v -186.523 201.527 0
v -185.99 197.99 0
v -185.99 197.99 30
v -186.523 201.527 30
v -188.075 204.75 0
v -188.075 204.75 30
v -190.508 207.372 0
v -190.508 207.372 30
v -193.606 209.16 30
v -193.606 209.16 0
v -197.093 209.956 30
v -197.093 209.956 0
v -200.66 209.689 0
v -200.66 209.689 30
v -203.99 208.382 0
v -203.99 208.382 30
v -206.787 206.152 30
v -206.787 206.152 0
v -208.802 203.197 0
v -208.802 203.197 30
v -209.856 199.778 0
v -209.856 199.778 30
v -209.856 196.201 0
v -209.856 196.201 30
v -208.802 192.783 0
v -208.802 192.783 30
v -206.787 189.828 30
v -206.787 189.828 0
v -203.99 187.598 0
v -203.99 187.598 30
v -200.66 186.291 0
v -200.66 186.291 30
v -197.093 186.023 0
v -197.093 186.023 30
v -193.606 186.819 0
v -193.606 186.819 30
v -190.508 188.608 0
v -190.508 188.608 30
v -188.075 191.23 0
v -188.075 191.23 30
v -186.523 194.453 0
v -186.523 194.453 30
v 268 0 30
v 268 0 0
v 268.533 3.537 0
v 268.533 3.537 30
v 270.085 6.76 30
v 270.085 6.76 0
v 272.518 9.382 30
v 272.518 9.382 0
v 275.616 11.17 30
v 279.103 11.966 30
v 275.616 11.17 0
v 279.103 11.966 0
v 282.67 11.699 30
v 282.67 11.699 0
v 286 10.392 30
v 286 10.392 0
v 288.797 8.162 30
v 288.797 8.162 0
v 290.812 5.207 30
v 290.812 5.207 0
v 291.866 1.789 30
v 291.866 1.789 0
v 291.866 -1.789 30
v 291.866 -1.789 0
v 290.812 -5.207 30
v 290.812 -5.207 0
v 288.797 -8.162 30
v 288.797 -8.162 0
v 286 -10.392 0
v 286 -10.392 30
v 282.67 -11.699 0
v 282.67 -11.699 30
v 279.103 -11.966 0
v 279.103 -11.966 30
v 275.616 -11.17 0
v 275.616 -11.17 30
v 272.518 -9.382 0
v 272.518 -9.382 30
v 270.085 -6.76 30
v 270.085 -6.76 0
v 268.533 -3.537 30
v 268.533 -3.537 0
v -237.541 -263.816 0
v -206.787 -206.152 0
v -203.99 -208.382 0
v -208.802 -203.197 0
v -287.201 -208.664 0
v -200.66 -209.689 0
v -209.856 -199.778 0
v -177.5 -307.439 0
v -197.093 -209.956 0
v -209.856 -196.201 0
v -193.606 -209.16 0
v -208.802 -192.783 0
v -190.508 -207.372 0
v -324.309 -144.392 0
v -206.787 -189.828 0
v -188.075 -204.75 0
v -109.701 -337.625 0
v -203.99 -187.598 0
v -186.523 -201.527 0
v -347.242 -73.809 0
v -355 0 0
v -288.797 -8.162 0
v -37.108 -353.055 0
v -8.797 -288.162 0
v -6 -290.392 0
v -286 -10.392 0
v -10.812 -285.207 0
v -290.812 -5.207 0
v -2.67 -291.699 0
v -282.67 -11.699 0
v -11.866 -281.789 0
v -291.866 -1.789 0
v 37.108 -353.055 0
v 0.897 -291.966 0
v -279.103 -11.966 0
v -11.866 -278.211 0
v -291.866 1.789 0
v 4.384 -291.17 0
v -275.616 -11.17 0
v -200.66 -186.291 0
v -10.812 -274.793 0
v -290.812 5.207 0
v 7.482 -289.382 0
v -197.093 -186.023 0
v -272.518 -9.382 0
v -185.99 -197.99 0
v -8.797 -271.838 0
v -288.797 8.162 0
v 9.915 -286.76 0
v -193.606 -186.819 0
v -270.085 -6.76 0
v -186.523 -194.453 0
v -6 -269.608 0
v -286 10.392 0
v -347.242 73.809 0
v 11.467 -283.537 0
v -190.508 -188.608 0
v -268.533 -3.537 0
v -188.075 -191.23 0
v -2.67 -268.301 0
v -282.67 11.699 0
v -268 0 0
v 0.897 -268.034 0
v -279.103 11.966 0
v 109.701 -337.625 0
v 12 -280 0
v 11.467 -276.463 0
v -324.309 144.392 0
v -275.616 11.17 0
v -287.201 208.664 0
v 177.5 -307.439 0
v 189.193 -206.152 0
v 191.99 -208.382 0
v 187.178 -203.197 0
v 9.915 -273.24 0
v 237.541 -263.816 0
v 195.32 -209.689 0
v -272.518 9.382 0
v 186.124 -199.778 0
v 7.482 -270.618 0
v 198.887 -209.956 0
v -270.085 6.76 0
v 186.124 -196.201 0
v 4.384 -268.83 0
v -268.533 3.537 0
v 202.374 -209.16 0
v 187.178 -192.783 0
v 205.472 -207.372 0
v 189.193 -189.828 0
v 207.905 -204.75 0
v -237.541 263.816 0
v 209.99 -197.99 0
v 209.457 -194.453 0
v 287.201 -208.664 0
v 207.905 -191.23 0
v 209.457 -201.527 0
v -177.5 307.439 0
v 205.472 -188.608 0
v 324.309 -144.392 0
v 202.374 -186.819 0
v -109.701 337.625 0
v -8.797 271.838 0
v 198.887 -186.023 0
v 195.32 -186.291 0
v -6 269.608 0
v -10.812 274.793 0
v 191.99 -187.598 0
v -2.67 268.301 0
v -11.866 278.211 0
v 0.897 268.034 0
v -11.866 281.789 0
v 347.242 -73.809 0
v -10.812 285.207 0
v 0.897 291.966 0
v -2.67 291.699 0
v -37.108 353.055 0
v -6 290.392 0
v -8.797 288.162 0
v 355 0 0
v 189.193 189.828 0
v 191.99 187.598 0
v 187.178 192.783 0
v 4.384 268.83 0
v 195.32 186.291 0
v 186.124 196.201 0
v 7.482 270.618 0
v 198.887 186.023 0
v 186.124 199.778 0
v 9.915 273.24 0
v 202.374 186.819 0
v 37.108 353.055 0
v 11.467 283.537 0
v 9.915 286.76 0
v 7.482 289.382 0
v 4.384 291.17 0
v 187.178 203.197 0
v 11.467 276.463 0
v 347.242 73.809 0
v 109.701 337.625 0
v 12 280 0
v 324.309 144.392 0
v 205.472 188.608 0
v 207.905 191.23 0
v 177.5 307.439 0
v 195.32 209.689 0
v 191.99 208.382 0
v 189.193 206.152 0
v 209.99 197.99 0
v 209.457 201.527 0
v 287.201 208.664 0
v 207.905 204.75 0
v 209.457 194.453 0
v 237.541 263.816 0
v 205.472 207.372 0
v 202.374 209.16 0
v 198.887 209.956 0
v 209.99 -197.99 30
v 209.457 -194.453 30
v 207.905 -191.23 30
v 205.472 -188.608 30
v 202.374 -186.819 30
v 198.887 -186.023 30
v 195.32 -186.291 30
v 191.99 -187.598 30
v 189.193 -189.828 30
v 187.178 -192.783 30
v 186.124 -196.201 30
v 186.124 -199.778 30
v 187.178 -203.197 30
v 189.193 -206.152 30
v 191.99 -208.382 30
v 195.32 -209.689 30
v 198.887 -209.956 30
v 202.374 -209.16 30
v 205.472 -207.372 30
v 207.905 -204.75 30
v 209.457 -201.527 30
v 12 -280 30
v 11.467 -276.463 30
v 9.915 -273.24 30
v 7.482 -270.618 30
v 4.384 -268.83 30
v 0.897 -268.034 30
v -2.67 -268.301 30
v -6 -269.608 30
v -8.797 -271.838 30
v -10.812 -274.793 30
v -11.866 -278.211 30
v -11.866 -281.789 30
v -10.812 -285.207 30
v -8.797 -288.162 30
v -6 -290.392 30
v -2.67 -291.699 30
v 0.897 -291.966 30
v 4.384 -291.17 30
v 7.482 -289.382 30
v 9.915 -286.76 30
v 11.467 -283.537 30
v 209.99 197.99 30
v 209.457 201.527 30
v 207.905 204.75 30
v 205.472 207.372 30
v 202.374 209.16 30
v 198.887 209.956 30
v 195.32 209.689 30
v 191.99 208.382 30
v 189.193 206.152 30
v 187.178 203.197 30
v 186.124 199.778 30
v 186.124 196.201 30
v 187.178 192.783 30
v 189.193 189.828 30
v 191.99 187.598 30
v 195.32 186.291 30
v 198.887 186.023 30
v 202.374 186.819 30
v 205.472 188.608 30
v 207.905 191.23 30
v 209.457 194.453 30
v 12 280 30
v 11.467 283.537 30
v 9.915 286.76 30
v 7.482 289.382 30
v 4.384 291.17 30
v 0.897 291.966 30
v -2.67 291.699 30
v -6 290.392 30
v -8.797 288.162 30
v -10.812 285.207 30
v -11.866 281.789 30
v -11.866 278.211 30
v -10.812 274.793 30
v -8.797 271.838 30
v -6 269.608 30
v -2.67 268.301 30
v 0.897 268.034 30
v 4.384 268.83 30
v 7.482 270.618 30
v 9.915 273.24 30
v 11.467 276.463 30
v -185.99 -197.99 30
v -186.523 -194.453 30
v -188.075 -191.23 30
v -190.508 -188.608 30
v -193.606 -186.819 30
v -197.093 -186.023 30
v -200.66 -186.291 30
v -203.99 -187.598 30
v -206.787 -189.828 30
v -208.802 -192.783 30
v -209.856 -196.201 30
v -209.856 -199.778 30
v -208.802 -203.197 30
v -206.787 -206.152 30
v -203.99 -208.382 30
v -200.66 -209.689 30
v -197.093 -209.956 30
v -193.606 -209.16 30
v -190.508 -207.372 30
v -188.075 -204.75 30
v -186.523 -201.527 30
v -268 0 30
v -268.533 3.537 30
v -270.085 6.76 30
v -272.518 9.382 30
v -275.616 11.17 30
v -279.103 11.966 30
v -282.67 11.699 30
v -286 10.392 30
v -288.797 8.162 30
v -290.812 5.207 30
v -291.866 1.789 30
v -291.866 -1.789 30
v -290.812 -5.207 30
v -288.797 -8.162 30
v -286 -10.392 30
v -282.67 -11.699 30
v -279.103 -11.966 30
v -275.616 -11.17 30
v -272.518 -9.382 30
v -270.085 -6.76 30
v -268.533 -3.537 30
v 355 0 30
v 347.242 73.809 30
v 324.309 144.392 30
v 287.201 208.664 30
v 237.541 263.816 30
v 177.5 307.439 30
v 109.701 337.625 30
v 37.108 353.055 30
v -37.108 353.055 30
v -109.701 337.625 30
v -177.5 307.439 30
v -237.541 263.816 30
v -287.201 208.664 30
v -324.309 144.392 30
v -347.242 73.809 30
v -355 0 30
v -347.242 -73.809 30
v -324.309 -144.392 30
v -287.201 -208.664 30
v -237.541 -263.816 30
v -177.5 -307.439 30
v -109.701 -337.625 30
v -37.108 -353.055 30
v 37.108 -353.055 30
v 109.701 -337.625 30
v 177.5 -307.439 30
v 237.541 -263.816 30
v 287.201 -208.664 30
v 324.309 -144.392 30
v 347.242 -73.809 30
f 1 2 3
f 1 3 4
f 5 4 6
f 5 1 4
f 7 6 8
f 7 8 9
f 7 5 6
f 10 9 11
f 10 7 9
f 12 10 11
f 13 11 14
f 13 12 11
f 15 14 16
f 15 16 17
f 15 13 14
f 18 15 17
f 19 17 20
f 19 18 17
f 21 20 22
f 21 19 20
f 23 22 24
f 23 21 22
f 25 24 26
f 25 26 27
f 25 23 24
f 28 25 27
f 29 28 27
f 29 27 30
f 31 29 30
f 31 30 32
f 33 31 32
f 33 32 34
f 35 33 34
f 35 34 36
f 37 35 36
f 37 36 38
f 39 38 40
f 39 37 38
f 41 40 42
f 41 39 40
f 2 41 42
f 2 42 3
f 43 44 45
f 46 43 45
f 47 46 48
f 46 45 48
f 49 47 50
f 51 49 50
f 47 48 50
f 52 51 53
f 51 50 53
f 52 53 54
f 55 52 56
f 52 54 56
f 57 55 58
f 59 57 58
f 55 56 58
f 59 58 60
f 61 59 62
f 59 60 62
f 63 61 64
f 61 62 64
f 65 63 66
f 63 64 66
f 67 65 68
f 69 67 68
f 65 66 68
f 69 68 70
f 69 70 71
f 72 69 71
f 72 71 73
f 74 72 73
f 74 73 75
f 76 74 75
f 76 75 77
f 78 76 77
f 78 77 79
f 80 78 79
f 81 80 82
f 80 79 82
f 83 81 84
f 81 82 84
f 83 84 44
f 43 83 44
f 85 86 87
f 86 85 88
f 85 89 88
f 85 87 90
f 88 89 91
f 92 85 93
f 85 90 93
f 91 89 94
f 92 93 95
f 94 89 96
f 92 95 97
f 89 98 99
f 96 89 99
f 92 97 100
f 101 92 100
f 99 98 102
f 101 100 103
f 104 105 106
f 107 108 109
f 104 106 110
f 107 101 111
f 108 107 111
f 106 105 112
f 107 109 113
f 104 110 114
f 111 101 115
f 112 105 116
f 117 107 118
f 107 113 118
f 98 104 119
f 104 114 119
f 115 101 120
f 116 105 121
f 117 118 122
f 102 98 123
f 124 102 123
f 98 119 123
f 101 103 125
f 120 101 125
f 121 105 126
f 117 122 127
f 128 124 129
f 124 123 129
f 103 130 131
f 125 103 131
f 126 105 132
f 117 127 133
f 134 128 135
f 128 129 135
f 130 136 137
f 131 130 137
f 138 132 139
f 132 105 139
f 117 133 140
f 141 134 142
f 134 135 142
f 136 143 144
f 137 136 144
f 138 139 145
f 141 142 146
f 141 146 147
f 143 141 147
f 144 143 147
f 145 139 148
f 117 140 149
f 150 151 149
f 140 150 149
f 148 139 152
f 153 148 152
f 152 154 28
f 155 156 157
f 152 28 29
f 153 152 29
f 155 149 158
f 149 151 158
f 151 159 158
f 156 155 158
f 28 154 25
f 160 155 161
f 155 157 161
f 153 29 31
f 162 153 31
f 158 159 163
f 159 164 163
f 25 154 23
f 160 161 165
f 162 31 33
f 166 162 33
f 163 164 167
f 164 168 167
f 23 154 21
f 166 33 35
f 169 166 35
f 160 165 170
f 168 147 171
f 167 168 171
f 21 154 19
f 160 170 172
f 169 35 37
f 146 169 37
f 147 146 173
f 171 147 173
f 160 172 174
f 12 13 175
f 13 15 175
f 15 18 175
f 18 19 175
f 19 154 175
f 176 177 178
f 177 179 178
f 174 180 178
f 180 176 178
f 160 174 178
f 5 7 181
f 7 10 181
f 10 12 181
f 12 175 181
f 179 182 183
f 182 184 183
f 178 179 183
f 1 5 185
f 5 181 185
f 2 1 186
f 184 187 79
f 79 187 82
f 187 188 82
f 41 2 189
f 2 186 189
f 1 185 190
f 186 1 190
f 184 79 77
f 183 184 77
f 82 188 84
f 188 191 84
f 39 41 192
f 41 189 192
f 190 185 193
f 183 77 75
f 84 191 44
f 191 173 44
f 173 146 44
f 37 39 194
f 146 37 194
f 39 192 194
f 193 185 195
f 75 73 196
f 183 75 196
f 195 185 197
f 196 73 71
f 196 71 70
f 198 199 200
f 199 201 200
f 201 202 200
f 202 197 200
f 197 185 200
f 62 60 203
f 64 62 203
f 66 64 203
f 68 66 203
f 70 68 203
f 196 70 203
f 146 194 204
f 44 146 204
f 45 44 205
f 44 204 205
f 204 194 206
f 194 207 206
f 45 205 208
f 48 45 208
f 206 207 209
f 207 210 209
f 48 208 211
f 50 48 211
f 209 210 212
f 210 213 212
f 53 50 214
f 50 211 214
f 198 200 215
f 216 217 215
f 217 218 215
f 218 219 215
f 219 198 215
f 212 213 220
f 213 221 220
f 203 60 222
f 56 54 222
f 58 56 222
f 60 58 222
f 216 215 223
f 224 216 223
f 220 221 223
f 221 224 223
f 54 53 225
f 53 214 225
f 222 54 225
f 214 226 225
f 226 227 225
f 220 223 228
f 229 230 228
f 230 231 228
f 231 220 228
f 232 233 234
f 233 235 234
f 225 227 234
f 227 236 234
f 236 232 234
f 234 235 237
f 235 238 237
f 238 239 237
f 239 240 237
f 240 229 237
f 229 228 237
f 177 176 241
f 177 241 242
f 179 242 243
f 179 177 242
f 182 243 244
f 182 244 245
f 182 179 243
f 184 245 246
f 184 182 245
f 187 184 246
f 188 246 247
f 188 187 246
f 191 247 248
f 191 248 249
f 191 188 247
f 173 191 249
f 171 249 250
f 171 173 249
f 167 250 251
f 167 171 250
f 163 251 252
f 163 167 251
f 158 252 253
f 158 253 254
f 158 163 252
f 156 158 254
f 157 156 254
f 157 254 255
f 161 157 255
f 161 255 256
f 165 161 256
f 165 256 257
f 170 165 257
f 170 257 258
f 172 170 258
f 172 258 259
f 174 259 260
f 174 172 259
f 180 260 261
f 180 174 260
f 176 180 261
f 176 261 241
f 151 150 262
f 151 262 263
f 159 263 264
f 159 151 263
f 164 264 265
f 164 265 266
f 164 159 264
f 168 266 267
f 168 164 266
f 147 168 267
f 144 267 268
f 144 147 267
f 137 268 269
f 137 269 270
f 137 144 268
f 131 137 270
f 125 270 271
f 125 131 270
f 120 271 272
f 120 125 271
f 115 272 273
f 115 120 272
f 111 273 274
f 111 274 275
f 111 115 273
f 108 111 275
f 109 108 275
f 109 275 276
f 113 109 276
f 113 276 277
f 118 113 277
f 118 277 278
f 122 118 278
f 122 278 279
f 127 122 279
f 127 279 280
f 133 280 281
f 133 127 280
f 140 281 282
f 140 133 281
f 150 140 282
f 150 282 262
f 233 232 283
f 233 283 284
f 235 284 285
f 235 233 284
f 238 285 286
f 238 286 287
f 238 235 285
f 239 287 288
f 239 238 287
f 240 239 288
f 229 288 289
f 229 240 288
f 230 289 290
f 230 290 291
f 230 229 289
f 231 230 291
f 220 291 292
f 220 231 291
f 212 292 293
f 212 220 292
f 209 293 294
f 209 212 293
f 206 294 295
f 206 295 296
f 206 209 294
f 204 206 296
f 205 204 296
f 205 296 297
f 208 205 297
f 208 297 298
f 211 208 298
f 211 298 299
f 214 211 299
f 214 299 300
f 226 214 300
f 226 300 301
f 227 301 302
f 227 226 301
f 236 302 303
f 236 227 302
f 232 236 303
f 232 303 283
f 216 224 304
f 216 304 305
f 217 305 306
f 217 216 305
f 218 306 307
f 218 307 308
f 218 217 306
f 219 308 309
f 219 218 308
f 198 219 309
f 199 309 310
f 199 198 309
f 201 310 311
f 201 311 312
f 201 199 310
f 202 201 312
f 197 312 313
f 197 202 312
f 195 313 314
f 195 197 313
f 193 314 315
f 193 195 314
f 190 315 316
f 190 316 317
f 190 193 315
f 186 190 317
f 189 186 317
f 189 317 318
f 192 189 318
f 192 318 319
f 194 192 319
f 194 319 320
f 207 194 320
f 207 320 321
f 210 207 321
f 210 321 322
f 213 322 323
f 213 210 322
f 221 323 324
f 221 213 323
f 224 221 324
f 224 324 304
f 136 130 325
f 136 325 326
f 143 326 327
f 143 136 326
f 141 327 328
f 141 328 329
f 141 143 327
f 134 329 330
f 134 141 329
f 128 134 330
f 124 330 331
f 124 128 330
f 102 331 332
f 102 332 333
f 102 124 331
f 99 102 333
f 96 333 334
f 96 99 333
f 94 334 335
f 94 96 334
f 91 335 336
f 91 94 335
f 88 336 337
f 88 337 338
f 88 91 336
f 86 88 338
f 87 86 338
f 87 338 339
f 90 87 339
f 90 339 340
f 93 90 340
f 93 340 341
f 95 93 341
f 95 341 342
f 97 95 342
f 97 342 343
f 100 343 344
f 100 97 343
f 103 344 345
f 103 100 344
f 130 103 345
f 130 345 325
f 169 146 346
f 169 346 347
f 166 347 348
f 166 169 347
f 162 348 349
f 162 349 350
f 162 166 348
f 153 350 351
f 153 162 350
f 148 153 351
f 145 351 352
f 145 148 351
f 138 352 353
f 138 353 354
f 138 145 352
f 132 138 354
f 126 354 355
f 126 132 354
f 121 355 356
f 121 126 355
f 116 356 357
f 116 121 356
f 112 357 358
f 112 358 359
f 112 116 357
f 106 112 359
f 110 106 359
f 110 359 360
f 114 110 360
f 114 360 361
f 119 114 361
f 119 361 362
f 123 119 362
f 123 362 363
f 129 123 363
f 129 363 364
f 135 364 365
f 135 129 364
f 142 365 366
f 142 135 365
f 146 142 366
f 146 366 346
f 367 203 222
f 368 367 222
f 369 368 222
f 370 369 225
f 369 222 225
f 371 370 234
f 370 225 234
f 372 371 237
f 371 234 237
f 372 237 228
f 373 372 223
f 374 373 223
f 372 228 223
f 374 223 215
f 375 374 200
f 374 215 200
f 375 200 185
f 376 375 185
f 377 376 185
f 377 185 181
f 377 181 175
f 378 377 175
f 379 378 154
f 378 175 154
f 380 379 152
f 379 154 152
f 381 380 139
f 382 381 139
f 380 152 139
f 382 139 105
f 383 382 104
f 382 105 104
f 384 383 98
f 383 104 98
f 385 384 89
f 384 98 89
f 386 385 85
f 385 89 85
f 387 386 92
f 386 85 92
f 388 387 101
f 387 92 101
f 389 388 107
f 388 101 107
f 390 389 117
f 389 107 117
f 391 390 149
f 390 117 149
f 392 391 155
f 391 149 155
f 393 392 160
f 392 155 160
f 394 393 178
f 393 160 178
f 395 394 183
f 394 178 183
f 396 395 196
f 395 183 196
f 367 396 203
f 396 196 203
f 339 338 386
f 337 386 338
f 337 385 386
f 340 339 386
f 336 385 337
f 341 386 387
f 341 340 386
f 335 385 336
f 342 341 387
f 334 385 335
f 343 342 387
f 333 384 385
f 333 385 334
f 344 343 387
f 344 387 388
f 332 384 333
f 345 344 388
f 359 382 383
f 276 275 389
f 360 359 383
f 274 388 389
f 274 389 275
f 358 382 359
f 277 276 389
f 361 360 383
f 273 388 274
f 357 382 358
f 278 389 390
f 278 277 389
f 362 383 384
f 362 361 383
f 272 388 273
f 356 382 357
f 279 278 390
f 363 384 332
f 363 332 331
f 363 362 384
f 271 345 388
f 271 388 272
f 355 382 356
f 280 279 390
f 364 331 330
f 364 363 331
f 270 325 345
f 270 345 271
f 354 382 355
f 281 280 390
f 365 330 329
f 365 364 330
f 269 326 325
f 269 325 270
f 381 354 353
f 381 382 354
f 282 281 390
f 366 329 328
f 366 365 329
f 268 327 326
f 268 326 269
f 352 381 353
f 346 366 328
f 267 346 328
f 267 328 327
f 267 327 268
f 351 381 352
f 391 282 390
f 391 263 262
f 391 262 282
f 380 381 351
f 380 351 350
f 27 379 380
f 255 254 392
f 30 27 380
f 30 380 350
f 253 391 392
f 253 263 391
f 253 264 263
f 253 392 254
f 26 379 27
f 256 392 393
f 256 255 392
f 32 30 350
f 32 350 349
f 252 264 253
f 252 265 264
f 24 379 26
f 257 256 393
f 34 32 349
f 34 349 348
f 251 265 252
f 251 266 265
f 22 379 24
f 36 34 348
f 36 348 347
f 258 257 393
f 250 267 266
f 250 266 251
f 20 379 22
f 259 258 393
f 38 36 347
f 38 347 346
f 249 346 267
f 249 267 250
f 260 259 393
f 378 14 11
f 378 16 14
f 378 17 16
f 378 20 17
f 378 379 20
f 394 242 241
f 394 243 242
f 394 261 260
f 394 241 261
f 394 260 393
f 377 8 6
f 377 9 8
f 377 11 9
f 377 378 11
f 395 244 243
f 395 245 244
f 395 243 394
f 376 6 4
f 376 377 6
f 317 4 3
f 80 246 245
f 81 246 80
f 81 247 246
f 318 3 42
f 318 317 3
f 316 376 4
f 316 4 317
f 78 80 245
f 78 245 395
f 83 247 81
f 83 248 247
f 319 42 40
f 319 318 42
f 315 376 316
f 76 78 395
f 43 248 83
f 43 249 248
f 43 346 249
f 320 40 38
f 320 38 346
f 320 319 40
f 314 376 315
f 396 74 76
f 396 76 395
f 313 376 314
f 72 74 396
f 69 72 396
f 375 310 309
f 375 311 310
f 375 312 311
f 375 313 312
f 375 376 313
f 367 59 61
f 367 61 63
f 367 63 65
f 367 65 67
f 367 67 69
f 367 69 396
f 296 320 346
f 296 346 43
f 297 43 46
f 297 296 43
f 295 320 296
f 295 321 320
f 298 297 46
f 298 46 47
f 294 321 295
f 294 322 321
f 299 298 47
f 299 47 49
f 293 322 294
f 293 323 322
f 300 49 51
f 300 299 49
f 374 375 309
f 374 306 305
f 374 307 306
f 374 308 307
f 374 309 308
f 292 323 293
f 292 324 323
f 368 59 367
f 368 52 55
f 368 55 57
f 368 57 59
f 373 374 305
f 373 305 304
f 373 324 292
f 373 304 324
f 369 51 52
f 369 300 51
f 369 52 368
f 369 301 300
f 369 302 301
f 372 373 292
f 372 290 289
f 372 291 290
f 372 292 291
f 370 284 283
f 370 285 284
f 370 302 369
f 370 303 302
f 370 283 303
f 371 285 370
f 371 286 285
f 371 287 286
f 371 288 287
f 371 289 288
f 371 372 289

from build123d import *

# Parameters (mm, degrees)
F0_R     = 355
F0_R_2   = 12
F1_DEPTH = 30


with BuildPart() as f1:
    # F0 (on Top) → F1 (new body)
    with BuildSketch(Plane.XY):
        Circle(F0_R)
        with Locations((-197.989899, -197.989899)):
            Circle(F0_R_2, mode=Mode.SUBTRACT)
        with Locations((0, -280)):
            Circle(F0_R_2, mode=Mode.SUBTRACT)
        with Locations((197.989899, -197.989899)):
            Circle(F0_R_2, mode=Mode.SUBTRACT)
        with Locations((-280, 0)):
            Circle(F0_R_2, mode=Mode.SUBTRACT)
        with Locations((-197.989899, 197.989899)):
            Circle(F0_R_2, mode=Mode.SUBTRACT)
        with BuildLine():
            ThreePointArc((292, 0), (280, -12), (268, 0))
            ThreePointArc((268, 0), (280, 12), (292, 0))
        make_face(mode=Mode.SUBTRACT)
        with Locations((0, 280)):
            Circle(F0_R_2, mode=Mode.SUBTRACT)
        with Locations((197.989899, 197.989899)):
            Circle(F0_R_2, mode=Mode.SUBTRACT)
    extrude(amount=F1_DEPTH)


solid = f1.part
